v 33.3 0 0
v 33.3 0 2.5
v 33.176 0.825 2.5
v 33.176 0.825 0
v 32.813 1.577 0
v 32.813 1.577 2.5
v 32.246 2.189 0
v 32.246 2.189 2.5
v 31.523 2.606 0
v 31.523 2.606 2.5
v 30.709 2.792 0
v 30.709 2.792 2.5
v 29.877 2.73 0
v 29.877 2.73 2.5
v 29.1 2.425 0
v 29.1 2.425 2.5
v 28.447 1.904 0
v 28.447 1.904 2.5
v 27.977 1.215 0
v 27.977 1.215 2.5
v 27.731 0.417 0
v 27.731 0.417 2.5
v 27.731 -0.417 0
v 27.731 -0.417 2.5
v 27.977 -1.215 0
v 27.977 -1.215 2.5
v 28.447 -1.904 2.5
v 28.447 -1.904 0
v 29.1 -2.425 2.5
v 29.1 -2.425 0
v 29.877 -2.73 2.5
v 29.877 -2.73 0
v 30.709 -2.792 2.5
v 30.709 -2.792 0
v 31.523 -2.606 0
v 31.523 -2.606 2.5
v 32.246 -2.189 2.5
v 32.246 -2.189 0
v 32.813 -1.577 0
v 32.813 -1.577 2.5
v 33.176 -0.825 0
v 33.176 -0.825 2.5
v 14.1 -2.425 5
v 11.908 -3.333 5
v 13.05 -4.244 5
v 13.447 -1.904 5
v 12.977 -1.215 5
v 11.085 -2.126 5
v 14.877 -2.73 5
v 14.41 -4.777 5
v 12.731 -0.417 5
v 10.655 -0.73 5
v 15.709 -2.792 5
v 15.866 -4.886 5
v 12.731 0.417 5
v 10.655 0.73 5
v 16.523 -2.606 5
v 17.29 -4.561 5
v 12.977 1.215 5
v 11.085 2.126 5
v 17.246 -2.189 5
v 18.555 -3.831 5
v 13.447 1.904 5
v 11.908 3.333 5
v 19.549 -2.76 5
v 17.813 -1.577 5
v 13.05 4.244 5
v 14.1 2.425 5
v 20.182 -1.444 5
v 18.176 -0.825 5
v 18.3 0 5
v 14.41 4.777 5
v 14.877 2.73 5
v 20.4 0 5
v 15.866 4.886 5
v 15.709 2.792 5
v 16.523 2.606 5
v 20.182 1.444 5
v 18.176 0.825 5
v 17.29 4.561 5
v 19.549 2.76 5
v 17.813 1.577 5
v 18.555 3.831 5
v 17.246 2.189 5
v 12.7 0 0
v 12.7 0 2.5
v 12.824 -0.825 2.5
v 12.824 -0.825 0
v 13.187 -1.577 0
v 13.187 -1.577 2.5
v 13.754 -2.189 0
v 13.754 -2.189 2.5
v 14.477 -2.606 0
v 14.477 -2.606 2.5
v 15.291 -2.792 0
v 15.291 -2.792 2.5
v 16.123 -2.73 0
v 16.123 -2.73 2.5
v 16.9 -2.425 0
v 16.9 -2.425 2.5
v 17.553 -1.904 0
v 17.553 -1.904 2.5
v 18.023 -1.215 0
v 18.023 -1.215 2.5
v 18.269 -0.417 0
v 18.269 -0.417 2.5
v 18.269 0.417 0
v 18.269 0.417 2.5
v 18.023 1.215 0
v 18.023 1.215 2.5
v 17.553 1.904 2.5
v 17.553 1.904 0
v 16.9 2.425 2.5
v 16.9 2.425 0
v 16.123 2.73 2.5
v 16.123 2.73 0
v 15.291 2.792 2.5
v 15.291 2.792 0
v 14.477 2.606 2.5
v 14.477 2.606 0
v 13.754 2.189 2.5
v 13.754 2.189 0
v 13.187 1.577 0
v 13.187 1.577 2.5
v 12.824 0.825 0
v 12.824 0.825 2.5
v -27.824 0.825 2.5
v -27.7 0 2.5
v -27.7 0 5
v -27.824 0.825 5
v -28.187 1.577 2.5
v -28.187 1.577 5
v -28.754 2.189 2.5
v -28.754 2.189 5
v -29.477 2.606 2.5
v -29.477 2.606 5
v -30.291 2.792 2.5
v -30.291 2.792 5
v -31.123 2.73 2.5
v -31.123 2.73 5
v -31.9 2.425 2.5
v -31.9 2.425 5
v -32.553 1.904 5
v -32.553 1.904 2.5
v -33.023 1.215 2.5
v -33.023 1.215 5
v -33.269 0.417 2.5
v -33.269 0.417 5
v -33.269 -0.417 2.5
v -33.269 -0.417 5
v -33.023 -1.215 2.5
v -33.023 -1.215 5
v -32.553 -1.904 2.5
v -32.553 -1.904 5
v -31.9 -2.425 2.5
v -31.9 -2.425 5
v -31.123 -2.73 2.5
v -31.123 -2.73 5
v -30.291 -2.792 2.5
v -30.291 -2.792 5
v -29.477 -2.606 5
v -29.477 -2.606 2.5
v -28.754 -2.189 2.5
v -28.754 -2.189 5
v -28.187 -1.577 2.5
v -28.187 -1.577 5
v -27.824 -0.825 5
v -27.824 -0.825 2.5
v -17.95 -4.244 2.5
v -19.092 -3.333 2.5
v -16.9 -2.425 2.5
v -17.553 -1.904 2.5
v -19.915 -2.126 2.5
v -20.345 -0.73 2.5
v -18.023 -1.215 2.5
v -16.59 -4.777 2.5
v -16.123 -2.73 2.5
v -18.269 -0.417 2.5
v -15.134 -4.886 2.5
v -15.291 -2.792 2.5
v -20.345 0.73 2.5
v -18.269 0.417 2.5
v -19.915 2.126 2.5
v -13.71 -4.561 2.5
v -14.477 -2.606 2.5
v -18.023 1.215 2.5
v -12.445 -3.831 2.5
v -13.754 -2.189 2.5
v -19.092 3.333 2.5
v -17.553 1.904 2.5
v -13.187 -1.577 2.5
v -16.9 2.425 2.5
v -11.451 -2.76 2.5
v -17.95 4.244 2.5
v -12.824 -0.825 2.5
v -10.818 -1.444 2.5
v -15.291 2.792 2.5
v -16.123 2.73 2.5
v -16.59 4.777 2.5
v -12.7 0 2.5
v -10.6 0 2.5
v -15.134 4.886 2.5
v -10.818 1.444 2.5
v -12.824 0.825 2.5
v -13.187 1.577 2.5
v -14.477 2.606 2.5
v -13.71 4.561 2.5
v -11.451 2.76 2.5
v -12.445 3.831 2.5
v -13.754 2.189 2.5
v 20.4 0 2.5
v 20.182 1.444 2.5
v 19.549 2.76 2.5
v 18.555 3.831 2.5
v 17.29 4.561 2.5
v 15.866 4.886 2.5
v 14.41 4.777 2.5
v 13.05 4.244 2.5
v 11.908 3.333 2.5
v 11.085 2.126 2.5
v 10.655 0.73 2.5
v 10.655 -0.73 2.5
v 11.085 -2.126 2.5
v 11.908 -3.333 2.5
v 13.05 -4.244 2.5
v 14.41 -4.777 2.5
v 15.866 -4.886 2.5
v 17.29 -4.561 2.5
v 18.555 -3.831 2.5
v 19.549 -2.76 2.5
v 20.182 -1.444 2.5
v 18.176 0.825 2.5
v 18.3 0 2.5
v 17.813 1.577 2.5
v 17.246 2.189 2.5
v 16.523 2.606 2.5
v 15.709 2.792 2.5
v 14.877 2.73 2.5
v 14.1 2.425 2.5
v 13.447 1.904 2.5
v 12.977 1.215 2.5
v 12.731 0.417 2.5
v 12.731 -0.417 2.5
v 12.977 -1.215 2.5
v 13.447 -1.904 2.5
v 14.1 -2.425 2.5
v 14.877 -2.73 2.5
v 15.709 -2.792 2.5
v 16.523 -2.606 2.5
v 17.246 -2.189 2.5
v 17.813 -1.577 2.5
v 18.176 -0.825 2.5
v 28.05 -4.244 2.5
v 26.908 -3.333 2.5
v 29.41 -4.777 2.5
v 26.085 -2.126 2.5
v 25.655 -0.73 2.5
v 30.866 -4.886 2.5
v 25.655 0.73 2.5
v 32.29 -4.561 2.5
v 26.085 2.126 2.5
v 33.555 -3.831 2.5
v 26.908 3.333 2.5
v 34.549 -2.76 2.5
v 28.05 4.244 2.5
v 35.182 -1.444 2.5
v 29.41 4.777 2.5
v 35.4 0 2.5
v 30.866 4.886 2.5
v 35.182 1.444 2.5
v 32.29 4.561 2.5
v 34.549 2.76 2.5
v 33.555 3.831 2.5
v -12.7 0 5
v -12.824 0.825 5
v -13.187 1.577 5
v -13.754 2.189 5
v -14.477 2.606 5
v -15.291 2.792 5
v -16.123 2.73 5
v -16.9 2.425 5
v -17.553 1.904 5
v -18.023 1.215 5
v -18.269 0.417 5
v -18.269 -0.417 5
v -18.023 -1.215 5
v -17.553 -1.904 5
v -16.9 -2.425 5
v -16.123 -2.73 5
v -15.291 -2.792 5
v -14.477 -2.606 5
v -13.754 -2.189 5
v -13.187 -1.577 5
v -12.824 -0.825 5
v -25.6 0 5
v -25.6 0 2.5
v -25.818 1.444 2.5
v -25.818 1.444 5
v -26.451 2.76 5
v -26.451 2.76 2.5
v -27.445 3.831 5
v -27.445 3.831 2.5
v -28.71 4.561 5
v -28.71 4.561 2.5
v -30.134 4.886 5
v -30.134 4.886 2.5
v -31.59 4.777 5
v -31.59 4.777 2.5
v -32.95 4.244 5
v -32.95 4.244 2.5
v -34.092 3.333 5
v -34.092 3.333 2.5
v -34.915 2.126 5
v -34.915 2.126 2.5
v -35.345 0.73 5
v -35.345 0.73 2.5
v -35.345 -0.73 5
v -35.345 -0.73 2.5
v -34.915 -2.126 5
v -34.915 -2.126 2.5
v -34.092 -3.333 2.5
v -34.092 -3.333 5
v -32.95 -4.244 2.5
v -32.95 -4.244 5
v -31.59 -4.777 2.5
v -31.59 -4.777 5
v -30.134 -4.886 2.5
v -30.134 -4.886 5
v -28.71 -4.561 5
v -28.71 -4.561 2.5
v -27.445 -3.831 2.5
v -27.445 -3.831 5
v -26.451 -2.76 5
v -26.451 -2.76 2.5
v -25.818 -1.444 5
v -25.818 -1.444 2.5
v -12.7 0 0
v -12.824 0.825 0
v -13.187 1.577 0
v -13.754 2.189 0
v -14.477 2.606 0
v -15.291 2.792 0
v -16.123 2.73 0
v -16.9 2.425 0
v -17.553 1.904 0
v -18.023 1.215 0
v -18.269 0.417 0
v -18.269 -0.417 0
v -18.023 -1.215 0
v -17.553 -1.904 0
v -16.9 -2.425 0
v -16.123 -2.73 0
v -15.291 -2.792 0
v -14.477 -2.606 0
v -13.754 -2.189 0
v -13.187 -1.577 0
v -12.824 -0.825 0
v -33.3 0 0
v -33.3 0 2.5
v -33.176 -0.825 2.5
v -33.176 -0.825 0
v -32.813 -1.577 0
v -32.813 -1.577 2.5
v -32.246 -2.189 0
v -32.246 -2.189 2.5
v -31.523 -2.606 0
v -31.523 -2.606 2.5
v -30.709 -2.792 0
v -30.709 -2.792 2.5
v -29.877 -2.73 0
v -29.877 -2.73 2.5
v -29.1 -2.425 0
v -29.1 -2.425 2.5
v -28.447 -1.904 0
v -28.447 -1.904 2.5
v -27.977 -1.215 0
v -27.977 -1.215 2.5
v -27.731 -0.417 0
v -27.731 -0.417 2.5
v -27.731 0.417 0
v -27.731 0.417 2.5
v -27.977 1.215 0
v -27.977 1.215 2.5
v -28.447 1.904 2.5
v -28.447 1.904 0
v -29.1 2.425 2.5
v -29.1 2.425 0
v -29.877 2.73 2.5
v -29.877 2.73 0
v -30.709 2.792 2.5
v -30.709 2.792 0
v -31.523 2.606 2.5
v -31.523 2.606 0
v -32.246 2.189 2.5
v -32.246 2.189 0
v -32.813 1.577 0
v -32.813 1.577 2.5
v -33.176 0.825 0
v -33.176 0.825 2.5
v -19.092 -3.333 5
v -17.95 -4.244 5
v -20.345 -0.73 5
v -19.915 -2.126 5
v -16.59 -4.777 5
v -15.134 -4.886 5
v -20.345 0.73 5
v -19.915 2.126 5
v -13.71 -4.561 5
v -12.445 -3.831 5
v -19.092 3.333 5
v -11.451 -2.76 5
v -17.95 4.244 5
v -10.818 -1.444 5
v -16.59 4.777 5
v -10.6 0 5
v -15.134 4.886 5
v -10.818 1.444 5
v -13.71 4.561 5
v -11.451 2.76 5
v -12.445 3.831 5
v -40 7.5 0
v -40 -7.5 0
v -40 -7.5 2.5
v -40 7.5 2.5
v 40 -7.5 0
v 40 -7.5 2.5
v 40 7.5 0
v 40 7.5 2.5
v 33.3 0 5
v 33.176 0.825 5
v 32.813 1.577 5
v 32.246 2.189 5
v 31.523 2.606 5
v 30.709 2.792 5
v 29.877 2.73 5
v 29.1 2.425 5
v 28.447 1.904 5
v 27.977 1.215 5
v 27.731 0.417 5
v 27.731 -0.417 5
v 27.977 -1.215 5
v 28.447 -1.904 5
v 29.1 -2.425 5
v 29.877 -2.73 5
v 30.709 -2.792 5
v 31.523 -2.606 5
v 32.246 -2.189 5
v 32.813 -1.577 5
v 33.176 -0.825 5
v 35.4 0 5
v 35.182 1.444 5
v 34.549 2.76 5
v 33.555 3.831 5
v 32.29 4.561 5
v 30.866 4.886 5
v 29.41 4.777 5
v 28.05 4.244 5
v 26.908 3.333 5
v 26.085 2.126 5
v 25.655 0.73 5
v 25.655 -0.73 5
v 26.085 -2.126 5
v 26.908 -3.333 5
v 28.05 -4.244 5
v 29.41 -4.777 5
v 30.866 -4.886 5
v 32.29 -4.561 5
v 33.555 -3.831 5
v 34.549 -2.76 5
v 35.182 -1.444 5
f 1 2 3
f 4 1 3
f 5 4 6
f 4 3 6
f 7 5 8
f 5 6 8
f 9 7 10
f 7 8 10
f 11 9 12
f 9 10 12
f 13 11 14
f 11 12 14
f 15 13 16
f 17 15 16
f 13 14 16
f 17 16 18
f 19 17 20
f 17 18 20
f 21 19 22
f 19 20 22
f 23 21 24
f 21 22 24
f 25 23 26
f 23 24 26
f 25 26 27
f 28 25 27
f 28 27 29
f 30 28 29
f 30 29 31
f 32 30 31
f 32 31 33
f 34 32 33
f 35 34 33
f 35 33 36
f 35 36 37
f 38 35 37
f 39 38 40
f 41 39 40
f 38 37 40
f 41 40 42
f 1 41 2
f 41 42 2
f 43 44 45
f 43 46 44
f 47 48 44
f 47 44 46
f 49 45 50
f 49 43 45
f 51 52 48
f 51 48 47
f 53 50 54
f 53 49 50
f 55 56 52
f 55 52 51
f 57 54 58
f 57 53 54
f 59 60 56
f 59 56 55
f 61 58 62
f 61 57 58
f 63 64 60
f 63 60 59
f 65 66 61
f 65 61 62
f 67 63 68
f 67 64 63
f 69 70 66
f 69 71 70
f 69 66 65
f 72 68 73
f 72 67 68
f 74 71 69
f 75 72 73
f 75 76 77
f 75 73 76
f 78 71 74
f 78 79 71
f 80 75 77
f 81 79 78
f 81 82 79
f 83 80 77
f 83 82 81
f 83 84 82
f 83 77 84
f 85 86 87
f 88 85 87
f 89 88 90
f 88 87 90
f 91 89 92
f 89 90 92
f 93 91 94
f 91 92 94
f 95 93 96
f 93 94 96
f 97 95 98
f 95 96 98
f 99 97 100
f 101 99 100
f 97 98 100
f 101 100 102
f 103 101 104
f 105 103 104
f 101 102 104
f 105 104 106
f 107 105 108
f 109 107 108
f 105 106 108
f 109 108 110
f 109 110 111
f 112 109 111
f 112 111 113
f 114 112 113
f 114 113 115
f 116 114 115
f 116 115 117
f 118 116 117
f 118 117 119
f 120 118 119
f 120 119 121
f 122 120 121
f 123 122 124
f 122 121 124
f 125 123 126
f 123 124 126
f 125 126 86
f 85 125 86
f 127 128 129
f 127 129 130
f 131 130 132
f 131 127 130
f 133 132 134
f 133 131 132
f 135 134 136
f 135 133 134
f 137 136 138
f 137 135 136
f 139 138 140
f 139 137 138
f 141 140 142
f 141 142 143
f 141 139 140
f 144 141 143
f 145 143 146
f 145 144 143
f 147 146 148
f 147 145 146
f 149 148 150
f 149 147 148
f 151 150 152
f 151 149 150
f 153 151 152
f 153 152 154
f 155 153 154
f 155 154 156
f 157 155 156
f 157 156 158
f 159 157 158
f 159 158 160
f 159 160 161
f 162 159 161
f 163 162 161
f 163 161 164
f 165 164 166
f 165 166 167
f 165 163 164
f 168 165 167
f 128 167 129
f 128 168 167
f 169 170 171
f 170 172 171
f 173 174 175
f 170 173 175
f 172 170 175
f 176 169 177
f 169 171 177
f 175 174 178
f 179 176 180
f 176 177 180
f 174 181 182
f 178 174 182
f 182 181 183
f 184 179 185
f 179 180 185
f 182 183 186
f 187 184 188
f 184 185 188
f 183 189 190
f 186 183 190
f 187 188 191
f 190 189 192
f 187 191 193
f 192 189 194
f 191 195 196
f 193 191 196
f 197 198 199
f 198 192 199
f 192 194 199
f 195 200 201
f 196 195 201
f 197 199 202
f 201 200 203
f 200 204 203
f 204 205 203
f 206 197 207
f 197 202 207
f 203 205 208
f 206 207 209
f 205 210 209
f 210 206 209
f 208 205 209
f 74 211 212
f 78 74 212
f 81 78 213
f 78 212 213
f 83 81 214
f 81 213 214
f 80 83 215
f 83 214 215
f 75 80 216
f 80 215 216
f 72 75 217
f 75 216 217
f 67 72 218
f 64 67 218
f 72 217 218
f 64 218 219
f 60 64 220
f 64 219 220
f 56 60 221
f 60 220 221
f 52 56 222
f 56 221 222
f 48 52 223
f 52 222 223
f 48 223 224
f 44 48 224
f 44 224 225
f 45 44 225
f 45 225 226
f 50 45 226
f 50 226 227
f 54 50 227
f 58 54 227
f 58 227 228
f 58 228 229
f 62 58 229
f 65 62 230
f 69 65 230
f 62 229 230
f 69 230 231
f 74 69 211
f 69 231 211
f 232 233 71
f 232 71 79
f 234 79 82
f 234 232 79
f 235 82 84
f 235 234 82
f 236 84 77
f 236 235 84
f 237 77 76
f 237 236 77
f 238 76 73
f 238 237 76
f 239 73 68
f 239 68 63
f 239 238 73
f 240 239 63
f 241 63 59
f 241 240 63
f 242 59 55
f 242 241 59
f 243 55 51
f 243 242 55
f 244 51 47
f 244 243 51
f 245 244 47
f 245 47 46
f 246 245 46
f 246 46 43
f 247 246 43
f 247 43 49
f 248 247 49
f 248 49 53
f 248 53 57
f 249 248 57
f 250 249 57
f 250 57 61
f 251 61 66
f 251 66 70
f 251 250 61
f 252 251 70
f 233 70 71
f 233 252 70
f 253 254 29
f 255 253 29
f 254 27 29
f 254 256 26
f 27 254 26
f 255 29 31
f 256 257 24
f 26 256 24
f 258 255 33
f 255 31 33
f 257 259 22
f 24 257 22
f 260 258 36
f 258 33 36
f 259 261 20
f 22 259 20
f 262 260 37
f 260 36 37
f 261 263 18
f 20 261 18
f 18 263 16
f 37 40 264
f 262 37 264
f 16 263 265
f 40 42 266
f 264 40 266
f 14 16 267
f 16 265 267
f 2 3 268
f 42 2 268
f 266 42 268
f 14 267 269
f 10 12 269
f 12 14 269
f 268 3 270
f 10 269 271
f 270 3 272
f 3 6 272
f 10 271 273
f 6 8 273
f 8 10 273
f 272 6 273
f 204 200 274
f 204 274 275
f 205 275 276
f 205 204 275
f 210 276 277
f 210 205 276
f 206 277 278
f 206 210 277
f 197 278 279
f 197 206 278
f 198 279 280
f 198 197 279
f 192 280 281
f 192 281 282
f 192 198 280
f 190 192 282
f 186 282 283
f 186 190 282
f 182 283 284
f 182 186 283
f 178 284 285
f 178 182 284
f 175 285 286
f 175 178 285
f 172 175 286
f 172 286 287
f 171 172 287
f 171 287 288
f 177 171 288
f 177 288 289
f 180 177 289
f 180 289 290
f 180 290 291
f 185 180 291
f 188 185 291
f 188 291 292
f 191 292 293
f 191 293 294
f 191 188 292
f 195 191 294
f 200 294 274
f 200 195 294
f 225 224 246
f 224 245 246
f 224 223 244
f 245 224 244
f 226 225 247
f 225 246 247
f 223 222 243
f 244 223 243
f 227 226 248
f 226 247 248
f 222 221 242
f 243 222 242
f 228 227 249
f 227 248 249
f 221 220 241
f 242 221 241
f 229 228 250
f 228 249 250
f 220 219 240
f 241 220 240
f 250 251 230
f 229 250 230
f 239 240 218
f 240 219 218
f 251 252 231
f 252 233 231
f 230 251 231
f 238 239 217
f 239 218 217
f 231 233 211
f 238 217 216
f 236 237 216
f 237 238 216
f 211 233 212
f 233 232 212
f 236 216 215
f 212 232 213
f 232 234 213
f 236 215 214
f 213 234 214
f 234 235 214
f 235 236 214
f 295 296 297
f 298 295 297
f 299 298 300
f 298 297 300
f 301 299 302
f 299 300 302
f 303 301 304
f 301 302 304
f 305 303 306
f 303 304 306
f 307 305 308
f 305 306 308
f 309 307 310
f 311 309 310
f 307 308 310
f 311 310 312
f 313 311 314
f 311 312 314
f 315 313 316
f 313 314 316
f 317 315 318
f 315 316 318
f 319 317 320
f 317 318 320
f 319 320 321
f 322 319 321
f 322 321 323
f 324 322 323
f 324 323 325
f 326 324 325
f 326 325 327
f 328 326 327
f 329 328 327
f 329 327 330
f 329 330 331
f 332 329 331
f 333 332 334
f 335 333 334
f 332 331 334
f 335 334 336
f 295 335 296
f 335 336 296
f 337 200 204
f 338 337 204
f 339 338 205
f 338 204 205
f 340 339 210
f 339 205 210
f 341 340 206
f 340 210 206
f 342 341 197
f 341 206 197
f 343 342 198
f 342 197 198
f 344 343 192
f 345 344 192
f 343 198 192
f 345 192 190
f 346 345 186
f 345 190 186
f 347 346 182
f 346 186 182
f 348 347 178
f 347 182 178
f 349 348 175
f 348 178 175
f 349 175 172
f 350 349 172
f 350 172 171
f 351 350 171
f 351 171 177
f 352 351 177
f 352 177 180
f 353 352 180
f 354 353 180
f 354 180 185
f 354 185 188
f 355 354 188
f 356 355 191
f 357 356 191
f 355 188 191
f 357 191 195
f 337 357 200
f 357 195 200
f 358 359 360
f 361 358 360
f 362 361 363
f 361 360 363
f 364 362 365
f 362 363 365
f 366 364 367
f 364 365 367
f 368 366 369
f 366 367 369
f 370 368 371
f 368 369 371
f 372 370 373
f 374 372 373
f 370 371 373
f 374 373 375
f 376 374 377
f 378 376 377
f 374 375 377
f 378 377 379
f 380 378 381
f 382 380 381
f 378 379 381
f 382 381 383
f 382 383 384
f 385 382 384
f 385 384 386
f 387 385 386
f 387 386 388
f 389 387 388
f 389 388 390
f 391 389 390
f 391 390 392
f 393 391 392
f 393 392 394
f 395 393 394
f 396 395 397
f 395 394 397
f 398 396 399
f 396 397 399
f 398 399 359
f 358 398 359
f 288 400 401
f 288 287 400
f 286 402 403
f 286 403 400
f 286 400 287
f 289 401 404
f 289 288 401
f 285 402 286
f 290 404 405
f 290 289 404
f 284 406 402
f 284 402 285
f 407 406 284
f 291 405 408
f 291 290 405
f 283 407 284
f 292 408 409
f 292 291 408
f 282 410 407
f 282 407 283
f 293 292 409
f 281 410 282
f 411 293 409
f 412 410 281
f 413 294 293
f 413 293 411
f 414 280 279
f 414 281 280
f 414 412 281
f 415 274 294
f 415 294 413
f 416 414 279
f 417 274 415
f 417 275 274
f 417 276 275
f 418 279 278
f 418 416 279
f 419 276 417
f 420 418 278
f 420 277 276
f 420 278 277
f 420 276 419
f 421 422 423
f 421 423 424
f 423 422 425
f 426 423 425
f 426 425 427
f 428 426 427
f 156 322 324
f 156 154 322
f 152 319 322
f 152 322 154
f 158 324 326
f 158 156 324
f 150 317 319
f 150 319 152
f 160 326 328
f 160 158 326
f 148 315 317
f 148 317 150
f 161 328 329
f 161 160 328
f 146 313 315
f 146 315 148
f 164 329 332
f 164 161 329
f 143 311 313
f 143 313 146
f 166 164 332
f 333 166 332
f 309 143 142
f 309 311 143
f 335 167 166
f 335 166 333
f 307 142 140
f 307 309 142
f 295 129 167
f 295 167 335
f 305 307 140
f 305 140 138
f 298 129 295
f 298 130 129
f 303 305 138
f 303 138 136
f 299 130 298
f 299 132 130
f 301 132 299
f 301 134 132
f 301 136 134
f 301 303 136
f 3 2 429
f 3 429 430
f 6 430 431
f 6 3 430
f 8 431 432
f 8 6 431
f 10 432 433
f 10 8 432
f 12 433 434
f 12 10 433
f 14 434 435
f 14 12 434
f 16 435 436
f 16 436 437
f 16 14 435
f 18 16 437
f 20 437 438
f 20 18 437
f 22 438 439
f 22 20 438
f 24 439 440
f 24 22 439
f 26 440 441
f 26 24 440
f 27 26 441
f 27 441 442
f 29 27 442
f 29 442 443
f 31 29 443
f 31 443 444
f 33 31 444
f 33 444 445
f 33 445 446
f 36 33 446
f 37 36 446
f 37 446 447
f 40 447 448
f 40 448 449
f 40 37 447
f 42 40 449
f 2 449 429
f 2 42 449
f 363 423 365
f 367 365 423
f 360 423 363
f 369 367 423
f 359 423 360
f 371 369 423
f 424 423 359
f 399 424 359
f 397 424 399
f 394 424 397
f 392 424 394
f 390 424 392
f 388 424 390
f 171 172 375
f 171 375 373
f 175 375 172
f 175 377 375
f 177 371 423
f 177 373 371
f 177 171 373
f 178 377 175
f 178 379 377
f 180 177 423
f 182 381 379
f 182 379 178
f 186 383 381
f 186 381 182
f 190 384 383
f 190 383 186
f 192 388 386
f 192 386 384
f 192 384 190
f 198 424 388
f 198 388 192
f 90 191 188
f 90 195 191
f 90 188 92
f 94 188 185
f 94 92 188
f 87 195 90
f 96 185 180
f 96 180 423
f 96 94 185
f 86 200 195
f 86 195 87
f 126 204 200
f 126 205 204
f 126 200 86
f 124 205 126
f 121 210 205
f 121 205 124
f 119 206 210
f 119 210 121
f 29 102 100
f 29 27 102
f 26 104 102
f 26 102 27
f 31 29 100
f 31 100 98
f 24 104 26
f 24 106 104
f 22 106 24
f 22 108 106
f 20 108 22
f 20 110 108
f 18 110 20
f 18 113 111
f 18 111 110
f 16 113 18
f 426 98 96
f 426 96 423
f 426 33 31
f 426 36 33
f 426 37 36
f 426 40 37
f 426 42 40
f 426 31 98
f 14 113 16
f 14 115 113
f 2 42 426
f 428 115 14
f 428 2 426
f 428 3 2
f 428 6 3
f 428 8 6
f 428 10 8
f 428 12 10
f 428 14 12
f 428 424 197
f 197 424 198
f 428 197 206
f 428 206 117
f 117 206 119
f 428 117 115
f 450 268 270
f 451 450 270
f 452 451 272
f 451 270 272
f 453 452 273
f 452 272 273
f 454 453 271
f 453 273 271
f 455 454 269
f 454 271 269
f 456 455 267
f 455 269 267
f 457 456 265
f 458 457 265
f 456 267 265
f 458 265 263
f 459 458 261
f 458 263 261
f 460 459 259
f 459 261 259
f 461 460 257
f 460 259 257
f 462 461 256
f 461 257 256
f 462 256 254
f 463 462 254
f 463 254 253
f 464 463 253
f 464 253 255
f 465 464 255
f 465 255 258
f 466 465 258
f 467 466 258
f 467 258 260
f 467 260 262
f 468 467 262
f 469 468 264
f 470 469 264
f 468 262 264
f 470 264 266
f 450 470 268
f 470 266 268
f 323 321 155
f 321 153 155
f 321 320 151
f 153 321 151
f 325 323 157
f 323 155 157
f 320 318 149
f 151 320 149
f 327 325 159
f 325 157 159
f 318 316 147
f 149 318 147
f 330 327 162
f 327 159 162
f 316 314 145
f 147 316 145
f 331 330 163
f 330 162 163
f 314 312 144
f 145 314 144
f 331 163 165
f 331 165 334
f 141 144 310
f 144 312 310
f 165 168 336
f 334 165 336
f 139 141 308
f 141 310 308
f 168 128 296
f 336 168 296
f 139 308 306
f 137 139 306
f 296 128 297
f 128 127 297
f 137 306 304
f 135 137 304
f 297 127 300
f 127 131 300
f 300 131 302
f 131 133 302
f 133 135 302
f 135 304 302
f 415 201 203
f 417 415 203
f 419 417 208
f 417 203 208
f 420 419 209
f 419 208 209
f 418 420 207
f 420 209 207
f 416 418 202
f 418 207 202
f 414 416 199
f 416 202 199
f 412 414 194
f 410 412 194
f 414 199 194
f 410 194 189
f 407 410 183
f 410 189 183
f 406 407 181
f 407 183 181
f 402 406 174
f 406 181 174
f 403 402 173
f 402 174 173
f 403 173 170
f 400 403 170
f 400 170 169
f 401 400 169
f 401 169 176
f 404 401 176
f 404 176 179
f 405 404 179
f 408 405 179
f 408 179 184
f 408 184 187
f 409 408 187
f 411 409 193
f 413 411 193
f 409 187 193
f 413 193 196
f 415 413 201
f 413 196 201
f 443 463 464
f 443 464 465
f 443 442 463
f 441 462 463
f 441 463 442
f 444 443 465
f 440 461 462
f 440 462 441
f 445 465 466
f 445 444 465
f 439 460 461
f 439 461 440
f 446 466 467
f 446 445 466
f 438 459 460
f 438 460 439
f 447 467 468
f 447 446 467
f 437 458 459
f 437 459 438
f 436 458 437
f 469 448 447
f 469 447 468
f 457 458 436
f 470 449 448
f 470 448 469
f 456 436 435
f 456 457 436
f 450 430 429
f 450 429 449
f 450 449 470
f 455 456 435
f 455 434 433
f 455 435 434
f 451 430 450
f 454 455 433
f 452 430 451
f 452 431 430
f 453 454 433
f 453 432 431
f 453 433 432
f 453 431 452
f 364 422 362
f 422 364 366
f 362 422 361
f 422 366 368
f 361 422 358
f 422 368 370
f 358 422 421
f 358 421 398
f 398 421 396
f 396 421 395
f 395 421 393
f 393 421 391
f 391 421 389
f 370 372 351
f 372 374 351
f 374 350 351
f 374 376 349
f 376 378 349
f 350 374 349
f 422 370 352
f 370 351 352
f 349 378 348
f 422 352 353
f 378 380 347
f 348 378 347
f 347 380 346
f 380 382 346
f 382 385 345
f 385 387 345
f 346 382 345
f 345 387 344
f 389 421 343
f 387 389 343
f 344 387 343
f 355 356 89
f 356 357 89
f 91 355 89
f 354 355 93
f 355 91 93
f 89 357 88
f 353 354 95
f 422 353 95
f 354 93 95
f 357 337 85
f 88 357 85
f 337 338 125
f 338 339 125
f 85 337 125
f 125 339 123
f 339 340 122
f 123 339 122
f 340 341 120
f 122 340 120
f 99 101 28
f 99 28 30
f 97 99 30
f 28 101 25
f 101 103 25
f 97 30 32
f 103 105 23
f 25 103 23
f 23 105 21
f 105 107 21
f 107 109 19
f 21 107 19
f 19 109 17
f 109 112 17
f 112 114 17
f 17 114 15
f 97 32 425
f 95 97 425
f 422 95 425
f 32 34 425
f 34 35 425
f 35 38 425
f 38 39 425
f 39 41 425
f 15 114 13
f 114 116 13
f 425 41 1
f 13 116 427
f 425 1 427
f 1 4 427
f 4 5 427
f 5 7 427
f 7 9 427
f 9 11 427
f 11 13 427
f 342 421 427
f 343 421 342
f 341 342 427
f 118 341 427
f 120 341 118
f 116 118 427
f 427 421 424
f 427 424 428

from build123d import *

# Parameters (mm, degrees)
SKETCH1_R             = 4.9
SKETCH1_R_2           = 2.8
BOSS_EXTRUDE1_DEPTH   = 5
BOSS_EXTRUDE1_2_DEPTH = 5
BOSS_EXTRUDE1_3_DEPTH = 5
BOSS_EXTRUDE1_4_DEPTH = 5
SKETCH3_W             = 80
SKETCH3_H             = 15
BOSS_EXTRUDE2_DEPTH   = 2.5
SKETCH4_R             = 2.8
CUT_EXTRUDE1_DEPTH    = 42.003048667


with BuildPart() as part:
    # Sketch1 → Boss-Extrude1 (new body)
    with BuildSketch(Plane.XY):
        with Locations((-15.5, 0)):
            Circle(SKETCH1_R)
        with Locations((-15.5, 0)):
            Circle(SKETCH1_R_2, mode=Mode.SUBTRACT)
    extrude(amount=BOSS_EXTRUDE1_DEPTH)



with BuildPart() as body_2:
    # Sketch1 → Boss-Extrude1 2 (new body)
    with BuildSketch(Plane.XY):
        with Locations((-30.5, 0)):
            Circle(SKETCH1_R)
        with Locations((-30.5, 0)):
            Circle(SKETCH1_R_2, mode=Mode.SUBTRACT)
    extrude(amount=BOSS_EXTRUDE1_2_DEPTH)


with BuildPart() as body_3:
    # Sketch1 → Boss-Extrude1 3 (new body)
    with BuildSketch(Plane.XY):
        with Locations((15.5, 0)):
            Circle(SKETCH1_R)
        with Locations((15.5, 0)):
            Circle(SKETCH1_R_2, mode=Mode.SUBTRACT)
    extrude(amount=BOSS_EXTRUDE1_3_DEPTH)


with BuildPart() as body_4:
    # Sketch1 → Boss-Extrude1 4 (new body)
    with BuildSketch(Plane.XY):
        with Locations((30.5, 0)):
            Circle(SKETCH1_R)
        with Locations((30.5, 0)):
            Circle(SKETCH1_R_2, mode=Mode.SUBTRACT)
    extrude(amount=BOSS_EXTRUDE1_4_DEPTH)


with BuildPart() as part_1:
    add(part.part)

    add(body_2.part)  # Boss-Extrude2 merges body 2

    add(body_3.part)  # Boss-Extrude2 merges body 3

    add(body_4.part)  # Boss-Extrude2 merges body 4
    # Sketch3 → Boss-Extrude2 (add)
    with BuildSketch(Plane.XY):
        Rectangle(SKETCH3_W, SKETCH3_H)
    extrude(amount=BOSS_EXTRUDE2_DEPTH)

    # Sketch4 → Cut-Extrude1 (cut, through all)
    with BuildSketch(Plane.XY.offset(5)):
        with Locations((-30.5, 0)):
            Circle(SKETCH4_R)
        with Locations((-15.5, 0)):
            Circle(SKETCH4_R)
        with Locations((15.5, 0)):
            Circle(SKETCH4_R)
        with Locations((30.5, 0)):
            Circle(SKETCH4_R)
    extrude(amount=-CUT_EXTRUDE1_DEPTH, mode=Mode.SUBTRACT)


with BuildPart() as body_2_2:
    # Split1: the piece on the far side of the plane
    add(part_1.part)
    split(bisect_by=Plane(origin=(0, 0, 2.5), x_dir=(-1, 0, 0), z_dir=(0, 0, -1)), keep=Keep.BOTTOM)


with BuildPart() as part_2:
    add(part_1.part)

    # Split1
    split(bisect_by=Plane(origin=(0, 0, 2.5), x_dir=(-1, 0, 0), z_dir=(0, 0, -1)), keep=Keep.TOP)


solid = Compound([body_2_2.part, part_2.part])
